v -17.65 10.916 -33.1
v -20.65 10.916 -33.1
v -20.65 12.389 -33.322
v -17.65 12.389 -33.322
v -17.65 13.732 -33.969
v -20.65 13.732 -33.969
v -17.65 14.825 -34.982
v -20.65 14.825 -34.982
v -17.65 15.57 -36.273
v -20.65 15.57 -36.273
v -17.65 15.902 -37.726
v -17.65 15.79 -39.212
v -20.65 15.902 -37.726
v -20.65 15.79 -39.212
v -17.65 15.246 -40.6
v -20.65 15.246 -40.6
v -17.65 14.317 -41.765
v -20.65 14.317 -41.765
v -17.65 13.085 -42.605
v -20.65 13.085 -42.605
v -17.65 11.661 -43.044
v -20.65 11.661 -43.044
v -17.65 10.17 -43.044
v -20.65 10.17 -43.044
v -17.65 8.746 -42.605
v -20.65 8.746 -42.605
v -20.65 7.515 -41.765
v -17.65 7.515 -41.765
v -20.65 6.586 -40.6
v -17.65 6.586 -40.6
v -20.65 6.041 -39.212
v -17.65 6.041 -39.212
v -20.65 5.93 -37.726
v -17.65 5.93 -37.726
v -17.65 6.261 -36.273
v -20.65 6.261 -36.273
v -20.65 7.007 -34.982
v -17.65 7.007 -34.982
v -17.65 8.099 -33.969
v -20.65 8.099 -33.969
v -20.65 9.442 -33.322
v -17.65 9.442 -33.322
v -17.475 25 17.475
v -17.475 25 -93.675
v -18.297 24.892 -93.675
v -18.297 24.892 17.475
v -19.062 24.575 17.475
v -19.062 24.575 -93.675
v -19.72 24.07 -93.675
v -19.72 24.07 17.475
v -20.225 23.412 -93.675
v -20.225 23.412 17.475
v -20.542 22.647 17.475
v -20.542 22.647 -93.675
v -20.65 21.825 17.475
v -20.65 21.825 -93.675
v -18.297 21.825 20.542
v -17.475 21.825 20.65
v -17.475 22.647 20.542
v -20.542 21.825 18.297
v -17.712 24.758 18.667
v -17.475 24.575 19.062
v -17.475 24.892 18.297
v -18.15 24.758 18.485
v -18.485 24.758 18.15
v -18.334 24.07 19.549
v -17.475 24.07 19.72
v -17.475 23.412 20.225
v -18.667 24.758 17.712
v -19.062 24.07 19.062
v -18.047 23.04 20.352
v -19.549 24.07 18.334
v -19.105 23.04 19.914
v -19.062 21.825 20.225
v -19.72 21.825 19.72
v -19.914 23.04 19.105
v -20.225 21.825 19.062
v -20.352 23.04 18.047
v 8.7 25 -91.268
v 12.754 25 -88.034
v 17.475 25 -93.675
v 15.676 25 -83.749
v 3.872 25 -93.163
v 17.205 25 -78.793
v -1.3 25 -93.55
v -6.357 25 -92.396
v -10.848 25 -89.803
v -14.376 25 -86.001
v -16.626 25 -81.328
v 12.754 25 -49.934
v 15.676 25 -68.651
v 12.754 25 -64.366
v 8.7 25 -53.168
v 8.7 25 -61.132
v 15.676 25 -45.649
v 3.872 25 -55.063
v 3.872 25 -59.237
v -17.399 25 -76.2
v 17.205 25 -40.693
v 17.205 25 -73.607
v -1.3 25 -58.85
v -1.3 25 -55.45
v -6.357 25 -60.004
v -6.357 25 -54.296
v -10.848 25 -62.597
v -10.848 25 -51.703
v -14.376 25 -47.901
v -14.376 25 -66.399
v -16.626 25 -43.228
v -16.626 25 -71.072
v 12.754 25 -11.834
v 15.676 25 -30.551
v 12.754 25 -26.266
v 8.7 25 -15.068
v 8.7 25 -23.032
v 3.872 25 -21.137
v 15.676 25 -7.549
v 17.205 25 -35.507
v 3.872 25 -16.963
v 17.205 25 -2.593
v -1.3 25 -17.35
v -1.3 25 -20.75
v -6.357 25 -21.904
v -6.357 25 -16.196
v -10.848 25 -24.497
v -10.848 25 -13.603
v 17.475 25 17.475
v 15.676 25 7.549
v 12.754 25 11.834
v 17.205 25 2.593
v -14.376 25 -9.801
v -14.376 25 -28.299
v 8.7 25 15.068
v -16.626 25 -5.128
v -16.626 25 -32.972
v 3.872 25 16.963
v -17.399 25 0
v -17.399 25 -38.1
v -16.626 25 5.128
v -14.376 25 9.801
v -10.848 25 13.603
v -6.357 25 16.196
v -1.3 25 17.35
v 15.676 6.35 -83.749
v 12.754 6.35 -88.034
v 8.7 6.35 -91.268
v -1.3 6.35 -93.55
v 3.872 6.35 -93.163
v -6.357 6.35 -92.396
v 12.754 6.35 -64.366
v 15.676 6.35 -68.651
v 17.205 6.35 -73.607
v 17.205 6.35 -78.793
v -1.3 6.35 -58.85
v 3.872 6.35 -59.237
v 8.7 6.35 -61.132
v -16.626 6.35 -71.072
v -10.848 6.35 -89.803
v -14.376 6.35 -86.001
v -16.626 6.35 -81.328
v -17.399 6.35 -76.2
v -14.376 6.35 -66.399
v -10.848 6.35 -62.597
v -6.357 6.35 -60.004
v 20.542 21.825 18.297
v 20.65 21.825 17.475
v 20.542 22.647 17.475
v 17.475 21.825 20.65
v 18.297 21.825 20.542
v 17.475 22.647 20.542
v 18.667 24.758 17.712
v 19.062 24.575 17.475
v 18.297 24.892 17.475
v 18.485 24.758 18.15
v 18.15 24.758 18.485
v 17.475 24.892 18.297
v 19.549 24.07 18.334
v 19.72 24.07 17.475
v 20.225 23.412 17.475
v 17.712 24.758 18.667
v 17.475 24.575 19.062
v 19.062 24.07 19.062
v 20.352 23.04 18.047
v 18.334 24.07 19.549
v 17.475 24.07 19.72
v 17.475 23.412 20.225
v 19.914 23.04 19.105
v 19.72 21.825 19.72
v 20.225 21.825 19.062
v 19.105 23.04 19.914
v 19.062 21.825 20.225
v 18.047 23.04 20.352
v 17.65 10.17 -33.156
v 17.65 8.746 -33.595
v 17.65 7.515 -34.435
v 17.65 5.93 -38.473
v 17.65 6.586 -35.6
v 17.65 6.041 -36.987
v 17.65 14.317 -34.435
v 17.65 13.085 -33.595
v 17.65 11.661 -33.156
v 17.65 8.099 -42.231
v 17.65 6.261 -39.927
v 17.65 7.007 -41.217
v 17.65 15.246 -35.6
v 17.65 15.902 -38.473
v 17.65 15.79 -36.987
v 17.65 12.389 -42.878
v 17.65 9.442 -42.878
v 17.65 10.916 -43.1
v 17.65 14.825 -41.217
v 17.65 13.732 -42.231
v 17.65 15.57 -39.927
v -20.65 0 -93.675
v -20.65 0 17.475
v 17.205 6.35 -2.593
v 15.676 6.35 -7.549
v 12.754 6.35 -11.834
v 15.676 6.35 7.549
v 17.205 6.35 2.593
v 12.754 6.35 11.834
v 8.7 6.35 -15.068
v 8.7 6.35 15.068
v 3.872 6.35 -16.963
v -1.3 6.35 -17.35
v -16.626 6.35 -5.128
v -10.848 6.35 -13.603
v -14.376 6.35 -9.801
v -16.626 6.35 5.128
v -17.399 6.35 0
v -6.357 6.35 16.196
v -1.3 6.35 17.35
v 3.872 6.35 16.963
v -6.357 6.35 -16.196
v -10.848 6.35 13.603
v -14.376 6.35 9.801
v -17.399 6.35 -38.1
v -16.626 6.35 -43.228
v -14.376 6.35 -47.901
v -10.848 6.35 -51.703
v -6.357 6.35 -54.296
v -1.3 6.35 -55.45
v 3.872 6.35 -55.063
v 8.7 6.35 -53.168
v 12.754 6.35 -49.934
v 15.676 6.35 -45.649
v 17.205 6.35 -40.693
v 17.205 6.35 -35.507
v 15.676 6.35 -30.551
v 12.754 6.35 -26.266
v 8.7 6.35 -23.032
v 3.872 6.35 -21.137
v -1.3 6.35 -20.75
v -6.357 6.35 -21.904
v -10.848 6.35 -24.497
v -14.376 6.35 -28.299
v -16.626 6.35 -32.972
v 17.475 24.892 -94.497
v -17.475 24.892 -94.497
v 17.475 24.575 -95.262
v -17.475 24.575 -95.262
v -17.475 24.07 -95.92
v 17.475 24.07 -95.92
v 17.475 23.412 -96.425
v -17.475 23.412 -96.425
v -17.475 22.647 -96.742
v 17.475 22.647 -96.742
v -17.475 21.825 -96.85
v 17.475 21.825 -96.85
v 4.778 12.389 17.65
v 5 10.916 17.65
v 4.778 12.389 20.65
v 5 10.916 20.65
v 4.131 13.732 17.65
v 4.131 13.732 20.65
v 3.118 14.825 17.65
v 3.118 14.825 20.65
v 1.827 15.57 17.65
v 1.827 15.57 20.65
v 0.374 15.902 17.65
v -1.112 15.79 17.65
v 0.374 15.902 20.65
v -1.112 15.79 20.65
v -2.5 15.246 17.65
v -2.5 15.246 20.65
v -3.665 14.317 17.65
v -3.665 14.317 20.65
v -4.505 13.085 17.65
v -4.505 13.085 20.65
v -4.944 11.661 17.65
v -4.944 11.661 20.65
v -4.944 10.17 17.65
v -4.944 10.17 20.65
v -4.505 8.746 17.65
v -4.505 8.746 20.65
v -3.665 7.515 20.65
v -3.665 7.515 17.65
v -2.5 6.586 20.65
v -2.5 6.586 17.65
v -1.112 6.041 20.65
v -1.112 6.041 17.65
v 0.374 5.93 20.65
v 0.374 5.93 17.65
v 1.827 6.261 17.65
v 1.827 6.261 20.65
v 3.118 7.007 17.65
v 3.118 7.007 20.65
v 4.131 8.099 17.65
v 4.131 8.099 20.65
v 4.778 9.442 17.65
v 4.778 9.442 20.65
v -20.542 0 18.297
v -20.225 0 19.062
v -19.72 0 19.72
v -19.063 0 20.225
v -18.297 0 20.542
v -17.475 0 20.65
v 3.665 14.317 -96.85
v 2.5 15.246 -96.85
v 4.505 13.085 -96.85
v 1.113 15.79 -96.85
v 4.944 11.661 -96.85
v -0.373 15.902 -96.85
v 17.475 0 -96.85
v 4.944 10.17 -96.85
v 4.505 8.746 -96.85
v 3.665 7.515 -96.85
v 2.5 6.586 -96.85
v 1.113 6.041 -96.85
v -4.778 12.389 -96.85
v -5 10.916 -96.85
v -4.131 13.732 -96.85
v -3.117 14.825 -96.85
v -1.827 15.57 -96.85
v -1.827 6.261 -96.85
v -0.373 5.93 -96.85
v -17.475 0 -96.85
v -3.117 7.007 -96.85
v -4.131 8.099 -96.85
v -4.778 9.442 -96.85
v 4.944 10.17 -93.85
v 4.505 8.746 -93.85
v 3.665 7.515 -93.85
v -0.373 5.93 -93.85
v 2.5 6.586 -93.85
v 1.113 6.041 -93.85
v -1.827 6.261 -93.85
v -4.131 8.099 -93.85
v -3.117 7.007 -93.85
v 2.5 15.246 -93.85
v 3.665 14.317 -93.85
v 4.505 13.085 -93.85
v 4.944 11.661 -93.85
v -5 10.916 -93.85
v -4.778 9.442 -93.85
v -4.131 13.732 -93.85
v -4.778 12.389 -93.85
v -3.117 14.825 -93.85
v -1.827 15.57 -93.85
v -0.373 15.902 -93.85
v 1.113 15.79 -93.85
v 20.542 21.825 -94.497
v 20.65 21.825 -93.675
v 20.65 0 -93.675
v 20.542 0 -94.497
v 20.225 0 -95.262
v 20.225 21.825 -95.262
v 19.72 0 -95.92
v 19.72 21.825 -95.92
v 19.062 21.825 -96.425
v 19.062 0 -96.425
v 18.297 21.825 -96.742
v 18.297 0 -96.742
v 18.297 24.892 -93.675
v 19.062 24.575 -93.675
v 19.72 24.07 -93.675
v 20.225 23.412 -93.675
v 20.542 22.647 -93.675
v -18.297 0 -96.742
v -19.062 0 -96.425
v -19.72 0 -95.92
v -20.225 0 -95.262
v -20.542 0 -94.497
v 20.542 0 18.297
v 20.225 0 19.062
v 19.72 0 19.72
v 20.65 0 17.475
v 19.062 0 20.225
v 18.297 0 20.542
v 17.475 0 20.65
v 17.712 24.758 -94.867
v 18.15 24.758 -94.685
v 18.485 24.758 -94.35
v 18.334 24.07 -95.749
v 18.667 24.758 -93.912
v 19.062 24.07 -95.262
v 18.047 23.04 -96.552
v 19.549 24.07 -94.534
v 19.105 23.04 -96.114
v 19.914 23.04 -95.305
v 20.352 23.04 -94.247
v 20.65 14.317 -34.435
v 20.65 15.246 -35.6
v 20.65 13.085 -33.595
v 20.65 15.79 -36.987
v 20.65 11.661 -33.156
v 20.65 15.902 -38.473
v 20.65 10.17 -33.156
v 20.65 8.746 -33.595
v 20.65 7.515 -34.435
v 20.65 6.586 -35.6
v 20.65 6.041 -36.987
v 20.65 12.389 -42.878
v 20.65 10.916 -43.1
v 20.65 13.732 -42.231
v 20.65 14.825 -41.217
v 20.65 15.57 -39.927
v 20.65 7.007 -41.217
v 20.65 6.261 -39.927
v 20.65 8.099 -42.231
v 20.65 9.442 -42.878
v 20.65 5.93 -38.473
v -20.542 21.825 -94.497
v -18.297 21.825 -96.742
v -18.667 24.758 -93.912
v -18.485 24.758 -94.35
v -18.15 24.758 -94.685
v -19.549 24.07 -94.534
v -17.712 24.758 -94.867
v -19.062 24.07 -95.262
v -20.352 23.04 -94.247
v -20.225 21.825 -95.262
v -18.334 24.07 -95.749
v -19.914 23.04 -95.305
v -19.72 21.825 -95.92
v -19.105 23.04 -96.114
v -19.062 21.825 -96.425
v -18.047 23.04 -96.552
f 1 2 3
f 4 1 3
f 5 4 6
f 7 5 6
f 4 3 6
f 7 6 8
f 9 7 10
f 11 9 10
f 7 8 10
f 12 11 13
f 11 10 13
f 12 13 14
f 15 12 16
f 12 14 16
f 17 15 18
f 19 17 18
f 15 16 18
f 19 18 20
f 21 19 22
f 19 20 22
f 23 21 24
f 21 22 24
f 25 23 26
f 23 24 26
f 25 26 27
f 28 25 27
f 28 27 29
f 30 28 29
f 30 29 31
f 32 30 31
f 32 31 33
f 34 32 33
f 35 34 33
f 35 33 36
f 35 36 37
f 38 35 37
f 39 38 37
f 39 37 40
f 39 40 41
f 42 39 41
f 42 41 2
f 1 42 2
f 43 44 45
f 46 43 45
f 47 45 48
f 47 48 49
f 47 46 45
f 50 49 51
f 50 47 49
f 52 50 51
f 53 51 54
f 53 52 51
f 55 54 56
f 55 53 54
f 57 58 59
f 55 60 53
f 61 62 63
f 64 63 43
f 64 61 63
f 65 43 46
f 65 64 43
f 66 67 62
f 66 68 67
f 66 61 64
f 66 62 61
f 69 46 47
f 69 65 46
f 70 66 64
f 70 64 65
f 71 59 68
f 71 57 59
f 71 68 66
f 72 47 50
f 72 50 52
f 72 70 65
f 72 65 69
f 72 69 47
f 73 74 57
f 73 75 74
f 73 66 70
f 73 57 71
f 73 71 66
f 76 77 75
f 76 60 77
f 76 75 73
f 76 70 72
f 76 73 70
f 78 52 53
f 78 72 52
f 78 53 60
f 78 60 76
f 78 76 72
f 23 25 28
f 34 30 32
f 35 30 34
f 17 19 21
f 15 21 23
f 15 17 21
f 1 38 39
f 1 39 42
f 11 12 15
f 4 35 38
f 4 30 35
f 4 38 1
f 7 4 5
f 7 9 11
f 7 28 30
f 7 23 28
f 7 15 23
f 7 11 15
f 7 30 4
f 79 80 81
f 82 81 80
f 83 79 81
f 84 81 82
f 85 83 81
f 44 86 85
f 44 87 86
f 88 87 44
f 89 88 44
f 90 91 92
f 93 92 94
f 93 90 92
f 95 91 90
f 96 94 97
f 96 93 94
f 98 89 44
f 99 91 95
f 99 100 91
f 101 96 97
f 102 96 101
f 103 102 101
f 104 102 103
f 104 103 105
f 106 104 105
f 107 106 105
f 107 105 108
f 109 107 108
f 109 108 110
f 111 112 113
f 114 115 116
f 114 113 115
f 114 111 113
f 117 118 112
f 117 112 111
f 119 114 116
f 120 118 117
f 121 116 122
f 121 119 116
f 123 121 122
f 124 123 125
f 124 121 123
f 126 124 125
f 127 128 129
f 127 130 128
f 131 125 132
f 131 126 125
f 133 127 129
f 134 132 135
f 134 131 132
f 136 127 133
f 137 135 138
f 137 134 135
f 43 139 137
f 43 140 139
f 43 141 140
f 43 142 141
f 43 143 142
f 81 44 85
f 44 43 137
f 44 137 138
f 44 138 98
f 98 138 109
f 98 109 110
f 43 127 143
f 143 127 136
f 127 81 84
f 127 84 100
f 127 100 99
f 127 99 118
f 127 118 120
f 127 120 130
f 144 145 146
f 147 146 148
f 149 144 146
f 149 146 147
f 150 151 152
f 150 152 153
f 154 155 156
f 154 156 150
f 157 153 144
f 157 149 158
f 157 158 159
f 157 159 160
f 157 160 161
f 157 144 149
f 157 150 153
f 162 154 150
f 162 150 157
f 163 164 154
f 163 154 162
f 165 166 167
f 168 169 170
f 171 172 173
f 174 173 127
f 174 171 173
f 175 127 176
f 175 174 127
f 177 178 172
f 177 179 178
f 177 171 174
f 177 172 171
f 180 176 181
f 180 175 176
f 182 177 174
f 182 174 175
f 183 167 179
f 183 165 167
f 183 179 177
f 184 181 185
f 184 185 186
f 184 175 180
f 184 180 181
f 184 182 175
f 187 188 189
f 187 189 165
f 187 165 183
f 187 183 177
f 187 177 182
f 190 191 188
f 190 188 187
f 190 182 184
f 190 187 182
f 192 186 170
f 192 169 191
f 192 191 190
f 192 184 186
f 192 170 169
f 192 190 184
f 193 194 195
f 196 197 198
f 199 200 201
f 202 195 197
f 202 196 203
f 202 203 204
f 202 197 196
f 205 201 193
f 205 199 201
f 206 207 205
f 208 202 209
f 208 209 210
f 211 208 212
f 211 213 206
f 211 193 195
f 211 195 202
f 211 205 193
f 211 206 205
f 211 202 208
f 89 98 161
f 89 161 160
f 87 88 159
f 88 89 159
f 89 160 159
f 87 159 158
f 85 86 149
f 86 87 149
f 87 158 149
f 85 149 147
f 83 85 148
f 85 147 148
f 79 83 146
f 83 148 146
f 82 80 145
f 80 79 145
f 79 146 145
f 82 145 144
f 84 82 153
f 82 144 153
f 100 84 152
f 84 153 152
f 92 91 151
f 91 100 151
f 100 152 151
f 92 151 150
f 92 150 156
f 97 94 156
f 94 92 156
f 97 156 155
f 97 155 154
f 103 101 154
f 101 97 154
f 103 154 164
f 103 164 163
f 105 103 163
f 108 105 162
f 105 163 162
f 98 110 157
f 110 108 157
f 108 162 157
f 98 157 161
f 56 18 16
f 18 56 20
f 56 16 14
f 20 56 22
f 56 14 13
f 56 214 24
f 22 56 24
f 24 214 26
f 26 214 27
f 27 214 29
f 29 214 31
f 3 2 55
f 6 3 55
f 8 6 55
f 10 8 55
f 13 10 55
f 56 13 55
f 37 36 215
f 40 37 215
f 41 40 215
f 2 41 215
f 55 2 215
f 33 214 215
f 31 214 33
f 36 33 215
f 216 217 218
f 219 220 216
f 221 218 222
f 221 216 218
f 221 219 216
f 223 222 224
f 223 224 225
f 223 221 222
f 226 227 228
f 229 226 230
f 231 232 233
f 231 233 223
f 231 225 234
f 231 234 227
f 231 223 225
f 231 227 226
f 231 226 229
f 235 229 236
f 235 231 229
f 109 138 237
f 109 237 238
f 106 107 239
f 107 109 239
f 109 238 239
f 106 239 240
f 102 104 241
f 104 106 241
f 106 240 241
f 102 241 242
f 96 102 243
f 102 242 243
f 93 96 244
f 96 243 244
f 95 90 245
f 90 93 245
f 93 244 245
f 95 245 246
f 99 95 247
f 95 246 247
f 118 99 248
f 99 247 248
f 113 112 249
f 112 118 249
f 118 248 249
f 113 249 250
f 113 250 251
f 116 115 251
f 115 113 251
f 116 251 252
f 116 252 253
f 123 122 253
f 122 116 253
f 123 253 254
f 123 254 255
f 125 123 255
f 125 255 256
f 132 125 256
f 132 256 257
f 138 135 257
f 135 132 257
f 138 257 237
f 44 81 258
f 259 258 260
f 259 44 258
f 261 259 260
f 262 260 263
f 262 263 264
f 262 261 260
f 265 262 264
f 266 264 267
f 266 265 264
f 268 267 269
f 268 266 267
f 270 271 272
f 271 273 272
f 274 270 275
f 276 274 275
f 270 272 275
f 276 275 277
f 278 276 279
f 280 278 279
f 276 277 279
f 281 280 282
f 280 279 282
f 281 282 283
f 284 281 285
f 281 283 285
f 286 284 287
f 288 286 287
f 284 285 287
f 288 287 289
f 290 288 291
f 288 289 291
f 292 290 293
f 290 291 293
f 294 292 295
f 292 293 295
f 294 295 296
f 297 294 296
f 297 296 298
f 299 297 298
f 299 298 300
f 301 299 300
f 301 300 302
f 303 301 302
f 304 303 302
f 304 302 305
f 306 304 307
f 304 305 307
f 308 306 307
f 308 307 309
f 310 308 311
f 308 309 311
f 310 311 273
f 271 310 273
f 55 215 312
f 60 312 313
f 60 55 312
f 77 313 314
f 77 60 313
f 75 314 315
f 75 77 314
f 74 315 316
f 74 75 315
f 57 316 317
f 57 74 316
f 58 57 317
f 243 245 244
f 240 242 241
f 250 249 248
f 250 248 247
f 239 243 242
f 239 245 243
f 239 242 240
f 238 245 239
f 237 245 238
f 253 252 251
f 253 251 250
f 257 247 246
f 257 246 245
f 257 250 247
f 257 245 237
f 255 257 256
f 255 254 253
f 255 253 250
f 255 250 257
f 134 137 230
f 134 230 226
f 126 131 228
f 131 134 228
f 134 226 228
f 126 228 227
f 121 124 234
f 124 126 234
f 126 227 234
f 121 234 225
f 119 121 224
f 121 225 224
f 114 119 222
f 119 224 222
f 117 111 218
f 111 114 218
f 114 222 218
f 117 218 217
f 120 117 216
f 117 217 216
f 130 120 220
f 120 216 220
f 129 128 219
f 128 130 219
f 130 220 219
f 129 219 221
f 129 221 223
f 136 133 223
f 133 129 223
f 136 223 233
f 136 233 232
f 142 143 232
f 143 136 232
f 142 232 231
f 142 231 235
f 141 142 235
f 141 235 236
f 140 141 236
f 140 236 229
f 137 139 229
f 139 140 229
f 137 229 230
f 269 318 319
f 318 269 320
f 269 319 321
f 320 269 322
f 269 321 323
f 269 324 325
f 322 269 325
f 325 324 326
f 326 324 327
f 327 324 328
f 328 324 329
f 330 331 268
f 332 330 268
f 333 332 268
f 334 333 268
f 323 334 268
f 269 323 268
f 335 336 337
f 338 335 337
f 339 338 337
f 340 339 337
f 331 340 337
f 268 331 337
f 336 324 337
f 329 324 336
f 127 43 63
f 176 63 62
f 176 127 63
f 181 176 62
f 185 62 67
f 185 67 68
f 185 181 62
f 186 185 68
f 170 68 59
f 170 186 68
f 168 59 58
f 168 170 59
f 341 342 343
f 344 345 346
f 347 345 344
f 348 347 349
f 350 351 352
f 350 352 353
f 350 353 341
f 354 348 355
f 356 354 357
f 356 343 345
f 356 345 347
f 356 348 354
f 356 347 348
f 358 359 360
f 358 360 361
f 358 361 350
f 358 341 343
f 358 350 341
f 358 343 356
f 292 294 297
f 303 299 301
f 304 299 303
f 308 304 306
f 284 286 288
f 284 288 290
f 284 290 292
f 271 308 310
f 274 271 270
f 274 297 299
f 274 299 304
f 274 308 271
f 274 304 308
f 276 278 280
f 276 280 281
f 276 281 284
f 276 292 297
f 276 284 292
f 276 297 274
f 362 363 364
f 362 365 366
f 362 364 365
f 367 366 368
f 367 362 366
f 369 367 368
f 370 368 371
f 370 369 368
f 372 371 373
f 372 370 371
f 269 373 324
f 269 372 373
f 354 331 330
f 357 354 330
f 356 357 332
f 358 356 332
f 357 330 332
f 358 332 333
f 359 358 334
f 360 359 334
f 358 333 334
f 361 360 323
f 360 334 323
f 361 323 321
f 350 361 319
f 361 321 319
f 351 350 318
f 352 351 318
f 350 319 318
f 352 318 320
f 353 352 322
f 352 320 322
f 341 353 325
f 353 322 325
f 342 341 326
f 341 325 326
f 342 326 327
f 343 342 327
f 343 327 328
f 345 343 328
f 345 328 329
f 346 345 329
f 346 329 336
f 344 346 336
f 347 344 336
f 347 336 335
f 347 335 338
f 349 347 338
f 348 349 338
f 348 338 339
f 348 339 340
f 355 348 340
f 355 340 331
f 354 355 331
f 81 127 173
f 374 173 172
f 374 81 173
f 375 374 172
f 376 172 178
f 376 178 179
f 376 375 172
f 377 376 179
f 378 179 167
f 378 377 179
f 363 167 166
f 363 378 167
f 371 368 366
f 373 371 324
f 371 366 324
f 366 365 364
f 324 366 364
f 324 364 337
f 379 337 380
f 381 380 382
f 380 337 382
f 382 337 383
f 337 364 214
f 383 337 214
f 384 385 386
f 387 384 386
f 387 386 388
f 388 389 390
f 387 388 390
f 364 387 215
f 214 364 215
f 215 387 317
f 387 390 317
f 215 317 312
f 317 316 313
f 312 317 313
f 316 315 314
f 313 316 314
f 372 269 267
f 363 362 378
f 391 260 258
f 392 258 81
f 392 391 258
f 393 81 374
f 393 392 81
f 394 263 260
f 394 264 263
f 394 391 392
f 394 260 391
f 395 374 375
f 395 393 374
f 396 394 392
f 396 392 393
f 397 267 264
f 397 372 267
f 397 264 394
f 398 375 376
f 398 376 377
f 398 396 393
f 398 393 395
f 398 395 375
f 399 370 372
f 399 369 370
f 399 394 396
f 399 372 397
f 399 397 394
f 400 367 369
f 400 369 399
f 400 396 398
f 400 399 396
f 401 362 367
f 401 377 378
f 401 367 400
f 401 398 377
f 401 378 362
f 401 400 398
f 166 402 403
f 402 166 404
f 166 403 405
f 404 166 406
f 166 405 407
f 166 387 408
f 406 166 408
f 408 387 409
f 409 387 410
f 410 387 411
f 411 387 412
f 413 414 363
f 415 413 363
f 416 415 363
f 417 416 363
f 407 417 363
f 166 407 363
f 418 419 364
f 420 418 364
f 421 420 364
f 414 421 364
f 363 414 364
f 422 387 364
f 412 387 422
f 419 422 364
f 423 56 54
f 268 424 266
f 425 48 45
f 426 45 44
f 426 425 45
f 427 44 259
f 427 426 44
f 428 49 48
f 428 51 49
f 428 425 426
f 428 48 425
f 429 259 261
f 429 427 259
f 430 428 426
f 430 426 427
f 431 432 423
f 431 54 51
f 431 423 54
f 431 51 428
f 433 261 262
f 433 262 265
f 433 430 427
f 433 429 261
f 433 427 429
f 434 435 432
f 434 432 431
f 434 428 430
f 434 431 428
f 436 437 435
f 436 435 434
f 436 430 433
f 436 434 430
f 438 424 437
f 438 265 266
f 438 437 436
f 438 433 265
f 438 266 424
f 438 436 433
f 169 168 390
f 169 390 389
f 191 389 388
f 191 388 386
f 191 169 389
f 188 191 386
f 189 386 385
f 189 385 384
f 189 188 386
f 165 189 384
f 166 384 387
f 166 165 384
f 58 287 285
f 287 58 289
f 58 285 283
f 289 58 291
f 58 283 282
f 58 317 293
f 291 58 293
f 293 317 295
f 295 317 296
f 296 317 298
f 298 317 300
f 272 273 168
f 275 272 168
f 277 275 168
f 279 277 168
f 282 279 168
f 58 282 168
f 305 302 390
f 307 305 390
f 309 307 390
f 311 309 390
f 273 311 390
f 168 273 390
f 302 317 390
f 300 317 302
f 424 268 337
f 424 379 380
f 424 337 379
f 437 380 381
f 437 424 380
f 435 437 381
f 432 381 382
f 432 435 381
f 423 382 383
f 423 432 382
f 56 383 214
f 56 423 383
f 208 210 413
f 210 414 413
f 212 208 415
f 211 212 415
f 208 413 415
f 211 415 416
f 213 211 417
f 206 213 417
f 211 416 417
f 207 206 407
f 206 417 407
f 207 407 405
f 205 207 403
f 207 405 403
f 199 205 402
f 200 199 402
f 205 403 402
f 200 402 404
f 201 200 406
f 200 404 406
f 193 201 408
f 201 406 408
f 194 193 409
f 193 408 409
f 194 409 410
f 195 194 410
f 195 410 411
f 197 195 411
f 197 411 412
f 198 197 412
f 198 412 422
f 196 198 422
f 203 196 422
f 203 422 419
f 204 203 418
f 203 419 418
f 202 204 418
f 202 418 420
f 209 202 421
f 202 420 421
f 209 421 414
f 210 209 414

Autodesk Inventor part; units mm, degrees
ref_plane "YZ Plane" through (0, 0, 0) normal (1, 0, 0) x (0, 1, 0)
ref_plane "XZ Plane" through (0, 0, 0) normal (0, 1, 0) x (-1, 0, 0)
ref_plane "XY Plane" through (0, 0, 0) normal (0, 0, 1) x (1, 0, 0)
sketch "Sketch1" plane through (0, 0, 0) normal (0, 1, 0) x (-1, 0, 0)
  circle A0 centre (0, 0) radius 17.399
  circle A1 centre (0, -38.1) radius 17.399
  circle A2 centre (0, -76.2) radius 17.399
  line L0 (20.65, 20.65) -> (-20.65, 20.65)
  line L1 (-20.65, 20.65) -> (-20.65, -96.85)
  line L2 (-20.65, -96.85) -> (20.65, -96.85)
  line L3 (20.65, -96.85) -> (20.65, 20.65)
  dimension "d0" = 34.798
  dimension "d1" = 34.798
  dimension "d2" = 38.1
  dimension "d3" = 34.798
  dimension "d4" = 38.1
  dimension "d5" = 20.65
  dimension "d6" = 20.65
  dimension "d7" = 20.65
  dimension "d8" = 20.65
extrude "Extrusion1" add sketch "Sketch1" along normal blind 25
extrude "Extrusion2" add sketch "Sketch1" along normal blind 6.35 contours A0 | A1 | A2
fillet "Fillet1" radius 3.175 8 edges at (20.65, 12.5, 20.65) (-20.65, 12.5, 20.65) (20.65, 12.5, -96.85) (-20.65, 12.5, -96.85) (0, 25, -96.85) (0, 25, 20.65) (20.65, 25, -38.1) (-20.65, 25, -38.1)
sketch "Sketch3" plane through (-20.65, 0, -93.675) normal (-1, 0, 0) x (0, 0, 1)
  circle A0 centre (55.5752, 10.9157) radius 5
  line L0 (0, 0) -> (0, 21.825) projected
  line L1 (0, 21.825) -> (111.15, 21.825) projected
  point P0 (93.675, 0)
  dimension "d19" = 10
  dimension "d20" = 55.5752
  dimension "d21" = 10.9093
extrude "Extrusion4" cut sketch "Sketch3" against normal blind 3
sketch "Sketch4" plane through (-17.475, 0, 20.65) normal (0, 0, 1) x (1, 0, 0)
  circle A0 centre (17.4752, 10.9157) radius 5
  line L0 (0, 0) -> (0, 21.825) projected
  line L1 (0, 21.825) -> (34.95, 21.825) projected
  point P0 (17.475, 0)
  dimension "d24" = 10
  dimension "d25" = 17.4752
  dimension "d26" = 10.9093
extrude "Extrusion5" cut sketch "Sketch4" against normal blind 3
sketch "Sketch5" plane through (20.65, 0, 17.475) normal (1, 0, 0) x (0, 0, -1)
  circle A0 centre (55.5748, 10.9157) radius 5 projected
  circle A1 centre (55.5748, 10.9157) radius 5
  point P0 (17.475, 0)
  dimension "d29" = 10
extrude "Extrusion6" cut sketch "Sketch5" against normal blind 3
sketch "Sketch6" plane through (17.475, 0, -96.85) normal (0, 0, -1) x (-1, 0, 0)
  circle A0 centre (17.4748, 10.9157) radius 5 projected
  circle A1 centre (17.4748, 10.9157) radius 5
  point P0 (17.475, 0)
extrude "Extrusion7" cut sketch "Sketch6" against normal blind 3
properties part number "_3DPrint"
